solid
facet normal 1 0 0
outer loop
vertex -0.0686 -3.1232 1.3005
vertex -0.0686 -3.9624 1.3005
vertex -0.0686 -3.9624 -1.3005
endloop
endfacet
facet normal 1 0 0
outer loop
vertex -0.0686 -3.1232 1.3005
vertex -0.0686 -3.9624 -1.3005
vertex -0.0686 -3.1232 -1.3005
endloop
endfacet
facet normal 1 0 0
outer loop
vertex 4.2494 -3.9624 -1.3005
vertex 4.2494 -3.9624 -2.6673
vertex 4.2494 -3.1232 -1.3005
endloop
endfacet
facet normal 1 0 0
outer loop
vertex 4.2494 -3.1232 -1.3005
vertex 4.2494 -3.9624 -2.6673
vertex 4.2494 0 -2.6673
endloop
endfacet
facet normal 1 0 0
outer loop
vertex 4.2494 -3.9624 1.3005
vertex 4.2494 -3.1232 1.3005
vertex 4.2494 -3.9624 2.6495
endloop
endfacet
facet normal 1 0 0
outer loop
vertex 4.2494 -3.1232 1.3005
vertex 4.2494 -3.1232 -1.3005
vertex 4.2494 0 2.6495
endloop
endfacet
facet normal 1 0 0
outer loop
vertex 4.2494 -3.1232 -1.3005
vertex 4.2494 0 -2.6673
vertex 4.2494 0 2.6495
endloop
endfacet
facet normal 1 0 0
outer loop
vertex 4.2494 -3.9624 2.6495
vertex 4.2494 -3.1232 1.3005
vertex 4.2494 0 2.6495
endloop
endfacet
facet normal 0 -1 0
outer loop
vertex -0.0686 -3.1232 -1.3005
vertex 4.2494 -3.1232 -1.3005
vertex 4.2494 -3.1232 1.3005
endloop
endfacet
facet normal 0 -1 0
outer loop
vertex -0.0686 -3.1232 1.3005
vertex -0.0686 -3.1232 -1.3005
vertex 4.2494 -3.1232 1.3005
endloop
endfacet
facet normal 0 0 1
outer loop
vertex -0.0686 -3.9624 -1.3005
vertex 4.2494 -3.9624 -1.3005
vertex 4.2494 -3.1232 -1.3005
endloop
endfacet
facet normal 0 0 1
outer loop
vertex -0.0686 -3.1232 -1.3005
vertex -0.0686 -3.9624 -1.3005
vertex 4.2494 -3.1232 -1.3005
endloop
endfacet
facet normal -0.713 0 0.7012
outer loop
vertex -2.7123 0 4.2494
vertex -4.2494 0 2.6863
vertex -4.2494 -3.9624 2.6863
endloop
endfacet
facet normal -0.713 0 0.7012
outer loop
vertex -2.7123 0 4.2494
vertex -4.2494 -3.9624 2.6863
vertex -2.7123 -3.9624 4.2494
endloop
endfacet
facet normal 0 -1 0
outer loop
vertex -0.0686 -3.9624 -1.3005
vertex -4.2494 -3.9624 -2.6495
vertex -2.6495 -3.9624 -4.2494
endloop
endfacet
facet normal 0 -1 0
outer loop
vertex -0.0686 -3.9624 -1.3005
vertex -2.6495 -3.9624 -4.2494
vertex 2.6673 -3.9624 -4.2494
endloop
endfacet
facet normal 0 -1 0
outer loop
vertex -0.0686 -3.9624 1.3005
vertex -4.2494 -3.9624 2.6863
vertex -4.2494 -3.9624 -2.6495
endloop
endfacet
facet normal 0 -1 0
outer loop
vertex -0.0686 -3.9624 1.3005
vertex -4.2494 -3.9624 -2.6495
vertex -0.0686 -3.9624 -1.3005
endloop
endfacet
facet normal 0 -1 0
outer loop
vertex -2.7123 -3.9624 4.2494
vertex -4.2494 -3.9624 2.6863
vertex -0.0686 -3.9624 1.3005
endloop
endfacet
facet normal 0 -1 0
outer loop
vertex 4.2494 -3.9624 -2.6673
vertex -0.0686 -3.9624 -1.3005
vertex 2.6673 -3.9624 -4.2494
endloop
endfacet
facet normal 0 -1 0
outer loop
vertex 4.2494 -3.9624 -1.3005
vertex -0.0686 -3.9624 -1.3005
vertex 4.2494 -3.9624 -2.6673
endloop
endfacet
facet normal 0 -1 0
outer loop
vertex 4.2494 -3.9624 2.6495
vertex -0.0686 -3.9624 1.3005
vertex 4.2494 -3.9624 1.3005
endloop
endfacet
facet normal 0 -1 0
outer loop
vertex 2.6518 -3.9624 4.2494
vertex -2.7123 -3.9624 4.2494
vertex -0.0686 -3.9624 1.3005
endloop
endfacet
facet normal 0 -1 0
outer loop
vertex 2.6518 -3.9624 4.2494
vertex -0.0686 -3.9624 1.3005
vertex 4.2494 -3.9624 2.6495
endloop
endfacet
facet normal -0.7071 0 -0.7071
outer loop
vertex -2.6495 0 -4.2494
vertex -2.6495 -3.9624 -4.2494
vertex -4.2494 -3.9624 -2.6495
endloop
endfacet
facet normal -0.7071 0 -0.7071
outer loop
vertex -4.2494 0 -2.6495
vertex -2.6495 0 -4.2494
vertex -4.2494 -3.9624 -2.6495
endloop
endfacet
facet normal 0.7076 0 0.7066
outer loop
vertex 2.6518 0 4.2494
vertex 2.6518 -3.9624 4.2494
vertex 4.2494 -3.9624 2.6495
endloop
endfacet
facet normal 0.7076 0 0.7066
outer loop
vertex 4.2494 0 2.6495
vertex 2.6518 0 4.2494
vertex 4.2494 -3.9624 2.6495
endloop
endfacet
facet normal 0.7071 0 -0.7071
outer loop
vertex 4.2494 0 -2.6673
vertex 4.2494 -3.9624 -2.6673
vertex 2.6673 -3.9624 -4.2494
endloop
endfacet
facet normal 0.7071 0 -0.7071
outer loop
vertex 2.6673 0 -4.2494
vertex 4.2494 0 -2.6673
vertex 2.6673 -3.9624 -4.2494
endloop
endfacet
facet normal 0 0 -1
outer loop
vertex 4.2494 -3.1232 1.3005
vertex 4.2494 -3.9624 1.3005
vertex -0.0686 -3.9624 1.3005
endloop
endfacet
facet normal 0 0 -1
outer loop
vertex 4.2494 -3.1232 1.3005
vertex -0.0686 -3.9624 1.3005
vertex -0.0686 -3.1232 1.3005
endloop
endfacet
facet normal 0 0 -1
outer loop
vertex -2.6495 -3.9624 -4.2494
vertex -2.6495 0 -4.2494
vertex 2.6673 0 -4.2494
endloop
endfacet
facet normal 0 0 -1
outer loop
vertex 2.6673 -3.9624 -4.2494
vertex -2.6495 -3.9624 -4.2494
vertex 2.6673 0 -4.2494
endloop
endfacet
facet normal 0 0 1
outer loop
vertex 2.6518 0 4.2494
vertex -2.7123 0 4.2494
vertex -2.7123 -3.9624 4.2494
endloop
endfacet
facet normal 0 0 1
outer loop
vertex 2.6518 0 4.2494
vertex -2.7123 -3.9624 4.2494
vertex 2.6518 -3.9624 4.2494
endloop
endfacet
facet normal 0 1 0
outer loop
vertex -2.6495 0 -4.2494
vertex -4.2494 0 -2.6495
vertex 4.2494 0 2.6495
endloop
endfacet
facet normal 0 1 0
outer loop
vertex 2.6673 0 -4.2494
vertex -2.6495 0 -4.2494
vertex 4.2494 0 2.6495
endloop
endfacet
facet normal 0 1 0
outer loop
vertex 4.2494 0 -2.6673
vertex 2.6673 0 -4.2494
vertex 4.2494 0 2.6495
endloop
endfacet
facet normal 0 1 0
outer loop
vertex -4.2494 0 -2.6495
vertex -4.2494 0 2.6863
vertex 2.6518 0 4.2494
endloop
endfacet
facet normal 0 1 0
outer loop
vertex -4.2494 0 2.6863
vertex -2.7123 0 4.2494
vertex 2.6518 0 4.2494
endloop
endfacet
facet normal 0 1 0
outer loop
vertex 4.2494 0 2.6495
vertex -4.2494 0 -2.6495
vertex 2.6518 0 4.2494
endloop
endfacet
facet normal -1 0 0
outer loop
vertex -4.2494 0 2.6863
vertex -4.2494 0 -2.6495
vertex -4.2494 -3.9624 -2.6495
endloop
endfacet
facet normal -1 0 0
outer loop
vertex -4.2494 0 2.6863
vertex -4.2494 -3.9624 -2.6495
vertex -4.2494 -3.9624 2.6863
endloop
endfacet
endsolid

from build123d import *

# Parameters (mm, degrees)
F0_W      = 8.49884
F0_H      = 8.49884
F2_DEPTH  = 3.9624
F3_DEPTH  = 4.2926
F5_DEPTH  = 4.572
F7_DEPTH  = 25.4
F9_DEPTH  = 25.4
F10_W     = 1.016
F10_H     = 2.60096
F11_DEPTH = 4.318


with BuildPart() as f2:
    # F0 (on Front) → F2 (new body)
    with BuildSketch(Plane.XZ):
        Rectangle(F0_W, F0_H)
    extrude(amount=F2_DEPTH)

    # F1 (on face) → F3 (cut)
    with BuildSketch(Plane.XZ):
        Polygon((-4.278509, 4.281422), (-4.251881, 2.683762), (-2.680849, 4.281422), align=None)
    extrude(amount=F3_DEPTH, mode=Mode.SUBTRACT)

    # F4 (on face) → F5 (cut)
    with BuildSketch(Plane.XZ.offset(3.9624)):
        Polygon((4.24942, 4.24942), (2.65176, 4.24942), (4.24942, 2.649474), align=None)
    extrude(amount=-F5_DEPTH, mode=Mode.SUBTRACT)

    # F6 (on face) → F7 (cut)
    with BuildSketch(Plane.XZ.offset(3.9624)):
        Polygon((-4.24942, -2.649474), (-4.24942, -4.24942), (-2.649474, -4.24942), align=None)
    extrude(amount=-F7_DEPTH, mode=Mode.SUBTRACT)

    # F8 (on face) → F9 (cut)
    with BuildSketch(Plane.XZ.offset(3.9624)):
        Polygon((2.667254, -4.24942), (4.24942, -4.24942), (4.24942, -2.667254), align=None)
    extrude(amount=-F9_DEPTH, mode=Mode.SUBTRACT)

    # F10 (on face) → F11 (cut)
    with BuildSketch(Plane.YZ.offset(4.24942)):
        with Locations((-3.631236, 0)):
            Rectangle(F10_W, F10_H)
    extrude(amount=-F11_DEPTH, mode=Mode.SUBTRACT)


solid = f2.part
